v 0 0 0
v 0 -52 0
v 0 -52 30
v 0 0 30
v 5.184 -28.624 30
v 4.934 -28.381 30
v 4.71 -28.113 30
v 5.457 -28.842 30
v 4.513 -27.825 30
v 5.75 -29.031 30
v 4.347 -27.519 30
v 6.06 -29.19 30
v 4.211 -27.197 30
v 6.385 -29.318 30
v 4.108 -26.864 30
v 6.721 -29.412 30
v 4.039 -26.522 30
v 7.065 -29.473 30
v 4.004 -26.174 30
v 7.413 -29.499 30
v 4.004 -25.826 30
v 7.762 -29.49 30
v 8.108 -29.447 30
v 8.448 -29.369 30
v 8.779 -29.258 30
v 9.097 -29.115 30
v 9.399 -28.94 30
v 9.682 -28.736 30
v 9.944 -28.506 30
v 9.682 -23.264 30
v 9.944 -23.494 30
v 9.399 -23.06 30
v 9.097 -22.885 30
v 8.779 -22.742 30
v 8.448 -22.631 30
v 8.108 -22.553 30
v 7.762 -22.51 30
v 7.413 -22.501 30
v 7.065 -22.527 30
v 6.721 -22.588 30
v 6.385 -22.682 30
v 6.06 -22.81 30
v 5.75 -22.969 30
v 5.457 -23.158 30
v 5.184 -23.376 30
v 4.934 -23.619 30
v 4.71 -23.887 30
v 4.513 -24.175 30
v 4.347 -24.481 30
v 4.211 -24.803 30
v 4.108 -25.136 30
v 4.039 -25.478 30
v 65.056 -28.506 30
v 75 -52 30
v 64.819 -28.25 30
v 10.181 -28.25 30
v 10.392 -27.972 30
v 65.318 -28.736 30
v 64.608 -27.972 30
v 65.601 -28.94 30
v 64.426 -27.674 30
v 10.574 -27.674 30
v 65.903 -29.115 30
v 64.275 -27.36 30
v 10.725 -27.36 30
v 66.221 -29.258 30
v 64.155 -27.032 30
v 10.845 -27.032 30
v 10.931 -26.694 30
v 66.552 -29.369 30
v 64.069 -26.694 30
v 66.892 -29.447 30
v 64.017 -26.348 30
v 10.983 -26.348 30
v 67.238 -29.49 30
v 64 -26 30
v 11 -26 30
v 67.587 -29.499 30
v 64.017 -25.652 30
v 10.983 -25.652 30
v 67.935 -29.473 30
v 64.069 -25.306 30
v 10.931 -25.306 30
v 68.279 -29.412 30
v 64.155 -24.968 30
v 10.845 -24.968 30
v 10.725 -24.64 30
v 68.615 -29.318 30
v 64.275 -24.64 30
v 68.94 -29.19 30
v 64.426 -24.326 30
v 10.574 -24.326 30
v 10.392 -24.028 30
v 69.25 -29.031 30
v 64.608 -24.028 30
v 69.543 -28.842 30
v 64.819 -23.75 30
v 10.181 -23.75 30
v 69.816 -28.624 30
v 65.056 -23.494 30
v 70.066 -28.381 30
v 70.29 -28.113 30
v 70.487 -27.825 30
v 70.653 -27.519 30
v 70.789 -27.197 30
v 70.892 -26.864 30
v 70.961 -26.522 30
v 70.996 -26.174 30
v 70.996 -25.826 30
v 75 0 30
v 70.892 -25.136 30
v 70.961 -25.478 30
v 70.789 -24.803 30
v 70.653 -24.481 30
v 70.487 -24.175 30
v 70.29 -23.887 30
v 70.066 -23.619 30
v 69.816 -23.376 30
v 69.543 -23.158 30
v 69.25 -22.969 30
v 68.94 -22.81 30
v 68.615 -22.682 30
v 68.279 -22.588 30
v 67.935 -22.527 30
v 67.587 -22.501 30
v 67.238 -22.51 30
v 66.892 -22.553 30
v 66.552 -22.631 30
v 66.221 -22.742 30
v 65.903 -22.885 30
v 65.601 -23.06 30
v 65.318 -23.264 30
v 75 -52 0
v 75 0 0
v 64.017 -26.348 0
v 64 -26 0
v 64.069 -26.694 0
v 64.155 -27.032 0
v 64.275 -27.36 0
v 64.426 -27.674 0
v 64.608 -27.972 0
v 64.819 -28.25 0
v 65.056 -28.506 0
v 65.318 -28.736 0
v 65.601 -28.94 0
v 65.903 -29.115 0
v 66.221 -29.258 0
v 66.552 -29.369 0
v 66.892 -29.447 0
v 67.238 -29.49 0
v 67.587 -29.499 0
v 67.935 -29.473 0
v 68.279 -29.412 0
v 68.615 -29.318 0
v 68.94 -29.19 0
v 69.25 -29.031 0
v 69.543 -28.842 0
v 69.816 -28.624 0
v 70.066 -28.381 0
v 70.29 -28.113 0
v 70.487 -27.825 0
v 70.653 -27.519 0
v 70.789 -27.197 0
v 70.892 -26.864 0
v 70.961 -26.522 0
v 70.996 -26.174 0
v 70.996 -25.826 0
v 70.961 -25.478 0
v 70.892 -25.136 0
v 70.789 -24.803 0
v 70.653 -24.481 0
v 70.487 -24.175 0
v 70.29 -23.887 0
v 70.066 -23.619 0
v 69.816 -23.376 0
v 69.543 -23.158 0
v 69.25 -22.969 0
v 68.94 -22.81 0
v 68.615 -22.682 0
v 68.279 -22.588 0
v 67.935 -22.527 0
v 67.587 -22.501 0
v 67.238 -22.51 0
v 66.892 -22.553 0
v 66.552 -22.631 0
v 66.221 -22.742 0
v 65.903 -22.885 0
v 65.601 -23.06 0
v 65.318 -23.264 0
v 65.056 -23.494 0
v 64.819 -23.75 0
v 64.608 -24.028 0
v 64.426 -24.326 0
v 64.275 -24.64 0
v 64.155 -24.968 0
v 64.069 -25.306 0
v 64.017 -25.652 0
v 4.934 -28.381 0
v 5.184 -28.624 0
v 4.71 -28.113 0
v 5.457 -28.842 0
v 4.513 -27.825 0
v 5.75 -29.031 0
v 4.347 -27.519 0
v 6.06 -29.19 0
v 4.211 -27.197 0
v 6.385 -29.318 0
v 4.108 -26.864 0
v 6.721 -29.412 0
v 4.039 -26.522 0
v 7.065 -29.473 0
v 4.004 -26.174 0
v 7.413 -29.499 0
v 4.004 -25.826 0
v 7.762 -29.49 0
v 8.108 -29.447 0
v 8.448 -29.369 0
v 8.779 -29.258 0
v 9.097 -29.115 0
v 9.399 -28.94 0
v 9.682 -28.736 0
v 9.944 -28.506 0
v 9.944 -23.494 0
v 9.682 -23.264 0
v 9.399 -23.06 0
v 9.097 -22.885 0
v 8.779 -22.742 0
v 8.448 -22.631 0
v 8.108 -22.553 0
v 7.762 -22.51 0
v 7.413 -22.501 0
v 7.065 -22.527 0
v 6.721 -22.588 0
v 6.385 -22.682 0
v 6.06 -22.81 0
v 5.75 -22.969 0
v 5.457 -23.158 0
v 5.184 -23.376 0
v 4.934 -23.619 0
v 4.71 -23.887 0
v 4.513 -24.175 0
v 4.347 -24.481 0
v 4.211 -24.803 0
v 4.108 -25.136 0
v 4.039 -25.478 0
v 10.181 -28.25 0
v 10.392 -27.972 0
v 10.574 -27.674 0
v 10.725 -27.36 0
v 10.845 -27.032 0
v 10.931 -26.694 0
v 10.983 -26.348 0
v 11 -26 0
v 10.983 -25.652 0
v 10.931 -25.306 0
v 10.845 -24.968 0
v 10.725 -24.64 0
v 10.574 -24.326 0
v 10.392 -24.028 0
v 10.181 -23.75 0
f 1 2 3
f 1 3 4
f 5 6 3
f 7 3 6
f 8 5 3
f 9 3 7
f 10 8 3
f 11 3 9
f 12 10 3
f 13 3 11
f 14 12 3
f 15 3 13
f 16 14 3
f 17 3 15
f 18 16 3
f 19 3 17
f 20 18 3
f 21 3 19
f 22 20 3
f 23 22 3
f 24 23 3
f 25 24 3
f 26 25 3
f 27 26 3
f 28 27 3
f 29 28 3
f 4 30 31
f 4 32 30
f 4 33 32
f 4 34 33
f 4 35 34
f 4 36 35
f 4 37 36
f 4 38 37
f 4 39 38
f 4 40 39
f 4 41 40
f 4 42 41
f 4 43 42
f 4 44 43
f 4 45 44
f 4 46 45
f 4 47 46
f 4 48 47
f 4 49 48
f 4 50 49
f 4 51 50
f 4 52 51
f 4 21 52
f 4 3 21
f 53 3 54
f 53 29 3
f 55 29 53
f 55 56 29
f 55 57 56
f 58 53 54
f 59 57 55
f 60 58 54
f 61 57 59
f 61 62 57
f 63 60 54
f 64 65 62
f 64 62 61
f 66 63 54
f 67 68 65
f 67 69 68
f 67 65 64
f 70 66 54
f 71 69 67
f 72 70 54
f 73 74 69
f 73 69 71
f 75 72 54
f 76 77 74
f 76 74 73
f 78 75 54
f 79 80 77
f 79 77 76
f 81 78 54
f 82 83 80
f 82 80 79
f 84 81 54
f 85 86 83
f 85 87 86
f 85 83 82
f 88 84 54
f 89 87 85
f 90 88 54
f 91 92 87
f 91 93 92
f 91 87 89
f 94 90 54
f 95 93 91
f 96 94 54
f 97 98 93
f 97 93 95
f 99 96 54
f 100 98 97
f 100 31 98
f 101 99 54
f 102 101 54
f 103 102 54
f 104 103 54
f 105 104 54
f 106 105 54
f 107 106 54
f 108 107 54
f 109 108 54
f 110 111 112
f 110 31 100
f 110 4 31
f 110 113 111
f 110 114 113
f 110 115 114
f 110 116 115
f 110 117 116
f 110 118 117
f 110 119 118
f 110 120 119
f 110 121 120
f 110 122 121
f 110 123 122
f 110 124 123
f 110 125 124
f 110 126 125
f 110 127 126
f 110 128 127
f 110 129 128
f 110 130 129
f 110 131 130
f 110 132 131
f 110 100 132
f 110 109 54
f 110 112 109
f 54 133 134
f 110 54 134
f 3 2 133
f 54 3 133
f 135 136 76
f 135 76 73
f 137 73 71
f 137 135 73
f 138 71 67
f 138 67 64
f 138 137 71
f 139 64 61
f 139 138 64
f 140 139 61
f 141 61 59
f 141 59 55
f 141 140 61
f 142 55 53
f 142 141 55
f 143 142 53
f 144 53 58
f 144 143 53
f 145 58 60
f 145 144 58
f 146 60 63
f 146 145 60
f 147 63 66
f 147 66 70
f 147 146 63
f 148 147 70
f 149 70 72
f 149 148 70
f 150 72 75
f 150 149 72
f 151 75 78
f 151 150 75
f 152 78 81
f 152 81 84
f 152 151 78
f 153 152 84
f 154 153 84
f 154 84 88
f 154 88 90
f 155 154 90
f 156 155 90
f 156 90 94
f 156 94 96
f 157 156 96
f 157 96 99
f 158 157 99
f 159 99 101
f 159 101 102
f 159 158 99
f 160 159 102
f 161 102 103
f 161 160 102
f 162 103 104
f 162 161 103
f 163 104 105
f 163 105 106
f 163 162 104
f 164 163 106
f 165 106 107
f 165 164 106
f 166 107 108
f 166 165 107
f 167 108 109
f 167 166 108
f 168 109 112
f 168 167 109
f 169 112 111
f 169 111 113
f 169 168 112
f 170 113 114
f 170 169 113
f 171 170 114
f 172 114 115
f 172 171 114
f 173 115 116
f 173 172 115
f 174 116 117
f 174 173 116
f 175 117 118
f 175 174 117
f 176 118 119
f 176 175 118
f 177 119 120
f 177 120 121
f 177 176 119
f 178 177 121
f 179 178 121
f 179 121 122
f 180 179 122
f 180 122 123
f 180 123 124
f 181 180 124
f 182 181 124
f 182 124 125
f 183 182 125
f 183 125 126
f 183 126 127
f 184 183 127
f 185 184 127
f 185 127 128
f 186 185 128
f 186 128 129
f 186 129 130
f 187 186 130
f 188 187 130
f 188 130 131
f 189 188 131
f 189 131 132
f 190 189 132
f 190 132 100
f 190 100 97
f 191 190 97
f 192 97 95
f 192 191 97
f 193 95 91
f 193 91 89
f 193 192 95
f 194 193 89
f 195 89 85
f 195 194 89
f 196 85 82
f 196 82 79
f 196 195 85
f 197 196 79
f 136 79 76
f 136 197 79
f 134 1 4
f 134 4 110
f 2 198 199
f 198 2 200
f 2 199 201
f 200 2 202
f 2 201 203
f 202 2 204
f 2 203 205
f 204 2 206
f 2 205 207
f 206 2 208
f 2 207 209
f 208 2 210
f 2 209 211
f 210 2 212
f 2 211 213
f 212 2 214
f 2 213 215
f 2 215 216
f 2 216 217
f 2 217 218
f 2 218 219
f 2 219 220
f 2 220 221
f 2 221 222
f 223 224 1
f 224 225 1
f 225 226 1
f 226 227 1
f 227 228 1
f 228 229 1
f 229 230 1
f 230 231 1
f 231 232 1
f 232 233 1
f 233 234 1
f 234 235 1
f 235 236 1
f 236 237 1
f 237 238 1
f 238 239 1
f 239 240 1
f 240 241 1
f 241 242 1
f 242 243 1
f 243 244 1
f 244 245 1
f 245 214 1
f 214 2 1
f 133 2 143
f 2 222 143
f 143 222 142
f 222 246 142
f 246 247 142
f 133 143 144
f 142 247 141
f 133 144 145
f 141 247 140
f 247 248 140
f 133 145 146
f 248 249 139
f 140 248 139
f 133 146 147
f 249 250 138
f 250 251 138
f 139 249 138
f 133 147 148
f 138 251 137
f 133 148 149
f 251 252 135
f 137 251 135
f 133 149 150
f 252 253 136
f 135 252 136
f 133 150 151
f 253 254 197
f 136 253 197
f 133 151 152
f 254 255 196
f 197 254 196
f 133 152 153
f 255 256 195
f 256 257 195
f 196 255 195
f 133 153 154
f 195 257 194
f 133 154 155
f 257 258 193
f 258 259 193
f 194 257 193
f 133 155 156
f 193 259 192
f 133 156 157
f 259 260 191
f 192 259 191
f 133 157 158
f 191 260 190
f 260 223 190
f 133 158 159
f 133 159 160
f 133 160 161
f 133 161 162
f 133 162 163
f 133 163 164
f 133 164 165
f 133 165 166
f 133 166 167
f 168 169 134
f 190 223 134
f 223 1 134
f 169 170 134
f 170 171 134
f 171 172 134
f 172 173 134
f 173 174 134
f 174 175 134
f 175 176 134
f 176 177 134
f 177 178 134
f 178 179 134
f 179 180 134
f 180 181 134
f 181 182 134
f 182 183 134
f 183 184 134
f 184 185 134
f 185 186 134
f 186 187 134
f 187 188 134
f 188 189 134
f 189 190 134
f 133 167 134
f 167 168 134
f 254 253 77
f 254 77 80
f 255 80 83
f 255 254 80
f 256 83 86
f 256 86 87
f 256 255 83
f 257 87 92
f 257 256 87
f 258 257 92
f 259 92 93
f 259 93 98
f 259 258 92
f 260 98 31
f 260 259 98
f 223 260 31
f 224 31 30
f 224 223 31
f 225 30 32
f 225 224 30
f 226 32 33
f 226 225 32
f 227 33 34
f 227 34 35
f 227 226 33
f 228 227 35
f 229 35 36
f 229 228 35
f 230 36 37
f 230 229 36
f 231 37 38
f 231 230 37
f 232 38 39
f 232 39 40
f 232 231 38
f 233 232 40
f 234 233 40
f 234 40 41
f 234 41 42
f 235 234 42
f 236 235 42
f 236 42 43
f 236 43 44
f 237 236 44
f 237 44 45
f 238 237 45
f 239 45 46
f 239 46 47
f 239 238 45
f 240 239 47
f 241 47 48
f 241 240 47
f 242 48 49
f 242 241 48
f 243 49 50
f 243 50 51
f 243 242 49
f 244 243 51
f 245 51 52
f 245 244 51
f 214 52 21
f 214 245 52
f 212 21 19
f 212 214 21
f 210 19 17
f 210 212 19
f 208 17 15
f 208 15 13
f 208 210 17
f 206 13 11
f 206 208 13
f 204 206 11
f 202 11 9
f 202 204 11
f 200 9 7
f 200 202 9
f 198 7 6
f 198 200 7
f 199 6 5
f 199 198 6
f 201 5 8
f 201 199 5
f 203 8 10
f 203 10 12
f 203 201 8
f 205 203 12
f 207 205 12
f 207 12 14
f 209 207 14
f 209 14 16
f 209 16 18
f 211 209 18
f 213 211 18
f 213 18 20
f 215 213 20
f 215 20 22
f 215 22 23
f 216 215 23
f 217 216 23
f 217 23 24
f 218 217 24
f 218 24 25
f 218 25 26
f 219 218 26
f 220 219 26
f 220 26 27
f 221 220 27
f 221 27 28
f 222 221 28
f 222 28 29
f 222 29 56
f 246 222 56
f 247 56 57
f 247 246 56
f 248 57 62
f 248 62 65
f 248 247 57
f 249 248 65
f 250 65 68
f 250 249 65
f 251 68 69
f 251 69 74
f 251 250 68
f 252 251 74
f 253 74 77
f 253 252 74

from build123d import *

# Parameters (mm, degrees)
SKETCH1_W           = 75
SKETCH1_H           = 52
SKETCH1_R           = 3.5
BOSS_EXTRUDE1_DEPTH = 30


with BuildPart() as part:
    # Sketch1 → Boss-Extrude1 (new body)
    with BuildSketch(Plane.XY):
        with Locations((37.5, -26)):
            Rectangle(SKETCH1_W, SKETCH1_H)
        with Locations((7.5, -26)):
            Circle(SKETCH1_R, mode=Mode.SUBTRACT)
        with Locations(Location((67.5, -26, 0), (0, 0, 180))):
            Circle(SKETCH1_R, mode=Mode.SUBTRACT)
    extrude(amount=BOSS_EXTRUDE1_DEPTH)


solid = part.part
